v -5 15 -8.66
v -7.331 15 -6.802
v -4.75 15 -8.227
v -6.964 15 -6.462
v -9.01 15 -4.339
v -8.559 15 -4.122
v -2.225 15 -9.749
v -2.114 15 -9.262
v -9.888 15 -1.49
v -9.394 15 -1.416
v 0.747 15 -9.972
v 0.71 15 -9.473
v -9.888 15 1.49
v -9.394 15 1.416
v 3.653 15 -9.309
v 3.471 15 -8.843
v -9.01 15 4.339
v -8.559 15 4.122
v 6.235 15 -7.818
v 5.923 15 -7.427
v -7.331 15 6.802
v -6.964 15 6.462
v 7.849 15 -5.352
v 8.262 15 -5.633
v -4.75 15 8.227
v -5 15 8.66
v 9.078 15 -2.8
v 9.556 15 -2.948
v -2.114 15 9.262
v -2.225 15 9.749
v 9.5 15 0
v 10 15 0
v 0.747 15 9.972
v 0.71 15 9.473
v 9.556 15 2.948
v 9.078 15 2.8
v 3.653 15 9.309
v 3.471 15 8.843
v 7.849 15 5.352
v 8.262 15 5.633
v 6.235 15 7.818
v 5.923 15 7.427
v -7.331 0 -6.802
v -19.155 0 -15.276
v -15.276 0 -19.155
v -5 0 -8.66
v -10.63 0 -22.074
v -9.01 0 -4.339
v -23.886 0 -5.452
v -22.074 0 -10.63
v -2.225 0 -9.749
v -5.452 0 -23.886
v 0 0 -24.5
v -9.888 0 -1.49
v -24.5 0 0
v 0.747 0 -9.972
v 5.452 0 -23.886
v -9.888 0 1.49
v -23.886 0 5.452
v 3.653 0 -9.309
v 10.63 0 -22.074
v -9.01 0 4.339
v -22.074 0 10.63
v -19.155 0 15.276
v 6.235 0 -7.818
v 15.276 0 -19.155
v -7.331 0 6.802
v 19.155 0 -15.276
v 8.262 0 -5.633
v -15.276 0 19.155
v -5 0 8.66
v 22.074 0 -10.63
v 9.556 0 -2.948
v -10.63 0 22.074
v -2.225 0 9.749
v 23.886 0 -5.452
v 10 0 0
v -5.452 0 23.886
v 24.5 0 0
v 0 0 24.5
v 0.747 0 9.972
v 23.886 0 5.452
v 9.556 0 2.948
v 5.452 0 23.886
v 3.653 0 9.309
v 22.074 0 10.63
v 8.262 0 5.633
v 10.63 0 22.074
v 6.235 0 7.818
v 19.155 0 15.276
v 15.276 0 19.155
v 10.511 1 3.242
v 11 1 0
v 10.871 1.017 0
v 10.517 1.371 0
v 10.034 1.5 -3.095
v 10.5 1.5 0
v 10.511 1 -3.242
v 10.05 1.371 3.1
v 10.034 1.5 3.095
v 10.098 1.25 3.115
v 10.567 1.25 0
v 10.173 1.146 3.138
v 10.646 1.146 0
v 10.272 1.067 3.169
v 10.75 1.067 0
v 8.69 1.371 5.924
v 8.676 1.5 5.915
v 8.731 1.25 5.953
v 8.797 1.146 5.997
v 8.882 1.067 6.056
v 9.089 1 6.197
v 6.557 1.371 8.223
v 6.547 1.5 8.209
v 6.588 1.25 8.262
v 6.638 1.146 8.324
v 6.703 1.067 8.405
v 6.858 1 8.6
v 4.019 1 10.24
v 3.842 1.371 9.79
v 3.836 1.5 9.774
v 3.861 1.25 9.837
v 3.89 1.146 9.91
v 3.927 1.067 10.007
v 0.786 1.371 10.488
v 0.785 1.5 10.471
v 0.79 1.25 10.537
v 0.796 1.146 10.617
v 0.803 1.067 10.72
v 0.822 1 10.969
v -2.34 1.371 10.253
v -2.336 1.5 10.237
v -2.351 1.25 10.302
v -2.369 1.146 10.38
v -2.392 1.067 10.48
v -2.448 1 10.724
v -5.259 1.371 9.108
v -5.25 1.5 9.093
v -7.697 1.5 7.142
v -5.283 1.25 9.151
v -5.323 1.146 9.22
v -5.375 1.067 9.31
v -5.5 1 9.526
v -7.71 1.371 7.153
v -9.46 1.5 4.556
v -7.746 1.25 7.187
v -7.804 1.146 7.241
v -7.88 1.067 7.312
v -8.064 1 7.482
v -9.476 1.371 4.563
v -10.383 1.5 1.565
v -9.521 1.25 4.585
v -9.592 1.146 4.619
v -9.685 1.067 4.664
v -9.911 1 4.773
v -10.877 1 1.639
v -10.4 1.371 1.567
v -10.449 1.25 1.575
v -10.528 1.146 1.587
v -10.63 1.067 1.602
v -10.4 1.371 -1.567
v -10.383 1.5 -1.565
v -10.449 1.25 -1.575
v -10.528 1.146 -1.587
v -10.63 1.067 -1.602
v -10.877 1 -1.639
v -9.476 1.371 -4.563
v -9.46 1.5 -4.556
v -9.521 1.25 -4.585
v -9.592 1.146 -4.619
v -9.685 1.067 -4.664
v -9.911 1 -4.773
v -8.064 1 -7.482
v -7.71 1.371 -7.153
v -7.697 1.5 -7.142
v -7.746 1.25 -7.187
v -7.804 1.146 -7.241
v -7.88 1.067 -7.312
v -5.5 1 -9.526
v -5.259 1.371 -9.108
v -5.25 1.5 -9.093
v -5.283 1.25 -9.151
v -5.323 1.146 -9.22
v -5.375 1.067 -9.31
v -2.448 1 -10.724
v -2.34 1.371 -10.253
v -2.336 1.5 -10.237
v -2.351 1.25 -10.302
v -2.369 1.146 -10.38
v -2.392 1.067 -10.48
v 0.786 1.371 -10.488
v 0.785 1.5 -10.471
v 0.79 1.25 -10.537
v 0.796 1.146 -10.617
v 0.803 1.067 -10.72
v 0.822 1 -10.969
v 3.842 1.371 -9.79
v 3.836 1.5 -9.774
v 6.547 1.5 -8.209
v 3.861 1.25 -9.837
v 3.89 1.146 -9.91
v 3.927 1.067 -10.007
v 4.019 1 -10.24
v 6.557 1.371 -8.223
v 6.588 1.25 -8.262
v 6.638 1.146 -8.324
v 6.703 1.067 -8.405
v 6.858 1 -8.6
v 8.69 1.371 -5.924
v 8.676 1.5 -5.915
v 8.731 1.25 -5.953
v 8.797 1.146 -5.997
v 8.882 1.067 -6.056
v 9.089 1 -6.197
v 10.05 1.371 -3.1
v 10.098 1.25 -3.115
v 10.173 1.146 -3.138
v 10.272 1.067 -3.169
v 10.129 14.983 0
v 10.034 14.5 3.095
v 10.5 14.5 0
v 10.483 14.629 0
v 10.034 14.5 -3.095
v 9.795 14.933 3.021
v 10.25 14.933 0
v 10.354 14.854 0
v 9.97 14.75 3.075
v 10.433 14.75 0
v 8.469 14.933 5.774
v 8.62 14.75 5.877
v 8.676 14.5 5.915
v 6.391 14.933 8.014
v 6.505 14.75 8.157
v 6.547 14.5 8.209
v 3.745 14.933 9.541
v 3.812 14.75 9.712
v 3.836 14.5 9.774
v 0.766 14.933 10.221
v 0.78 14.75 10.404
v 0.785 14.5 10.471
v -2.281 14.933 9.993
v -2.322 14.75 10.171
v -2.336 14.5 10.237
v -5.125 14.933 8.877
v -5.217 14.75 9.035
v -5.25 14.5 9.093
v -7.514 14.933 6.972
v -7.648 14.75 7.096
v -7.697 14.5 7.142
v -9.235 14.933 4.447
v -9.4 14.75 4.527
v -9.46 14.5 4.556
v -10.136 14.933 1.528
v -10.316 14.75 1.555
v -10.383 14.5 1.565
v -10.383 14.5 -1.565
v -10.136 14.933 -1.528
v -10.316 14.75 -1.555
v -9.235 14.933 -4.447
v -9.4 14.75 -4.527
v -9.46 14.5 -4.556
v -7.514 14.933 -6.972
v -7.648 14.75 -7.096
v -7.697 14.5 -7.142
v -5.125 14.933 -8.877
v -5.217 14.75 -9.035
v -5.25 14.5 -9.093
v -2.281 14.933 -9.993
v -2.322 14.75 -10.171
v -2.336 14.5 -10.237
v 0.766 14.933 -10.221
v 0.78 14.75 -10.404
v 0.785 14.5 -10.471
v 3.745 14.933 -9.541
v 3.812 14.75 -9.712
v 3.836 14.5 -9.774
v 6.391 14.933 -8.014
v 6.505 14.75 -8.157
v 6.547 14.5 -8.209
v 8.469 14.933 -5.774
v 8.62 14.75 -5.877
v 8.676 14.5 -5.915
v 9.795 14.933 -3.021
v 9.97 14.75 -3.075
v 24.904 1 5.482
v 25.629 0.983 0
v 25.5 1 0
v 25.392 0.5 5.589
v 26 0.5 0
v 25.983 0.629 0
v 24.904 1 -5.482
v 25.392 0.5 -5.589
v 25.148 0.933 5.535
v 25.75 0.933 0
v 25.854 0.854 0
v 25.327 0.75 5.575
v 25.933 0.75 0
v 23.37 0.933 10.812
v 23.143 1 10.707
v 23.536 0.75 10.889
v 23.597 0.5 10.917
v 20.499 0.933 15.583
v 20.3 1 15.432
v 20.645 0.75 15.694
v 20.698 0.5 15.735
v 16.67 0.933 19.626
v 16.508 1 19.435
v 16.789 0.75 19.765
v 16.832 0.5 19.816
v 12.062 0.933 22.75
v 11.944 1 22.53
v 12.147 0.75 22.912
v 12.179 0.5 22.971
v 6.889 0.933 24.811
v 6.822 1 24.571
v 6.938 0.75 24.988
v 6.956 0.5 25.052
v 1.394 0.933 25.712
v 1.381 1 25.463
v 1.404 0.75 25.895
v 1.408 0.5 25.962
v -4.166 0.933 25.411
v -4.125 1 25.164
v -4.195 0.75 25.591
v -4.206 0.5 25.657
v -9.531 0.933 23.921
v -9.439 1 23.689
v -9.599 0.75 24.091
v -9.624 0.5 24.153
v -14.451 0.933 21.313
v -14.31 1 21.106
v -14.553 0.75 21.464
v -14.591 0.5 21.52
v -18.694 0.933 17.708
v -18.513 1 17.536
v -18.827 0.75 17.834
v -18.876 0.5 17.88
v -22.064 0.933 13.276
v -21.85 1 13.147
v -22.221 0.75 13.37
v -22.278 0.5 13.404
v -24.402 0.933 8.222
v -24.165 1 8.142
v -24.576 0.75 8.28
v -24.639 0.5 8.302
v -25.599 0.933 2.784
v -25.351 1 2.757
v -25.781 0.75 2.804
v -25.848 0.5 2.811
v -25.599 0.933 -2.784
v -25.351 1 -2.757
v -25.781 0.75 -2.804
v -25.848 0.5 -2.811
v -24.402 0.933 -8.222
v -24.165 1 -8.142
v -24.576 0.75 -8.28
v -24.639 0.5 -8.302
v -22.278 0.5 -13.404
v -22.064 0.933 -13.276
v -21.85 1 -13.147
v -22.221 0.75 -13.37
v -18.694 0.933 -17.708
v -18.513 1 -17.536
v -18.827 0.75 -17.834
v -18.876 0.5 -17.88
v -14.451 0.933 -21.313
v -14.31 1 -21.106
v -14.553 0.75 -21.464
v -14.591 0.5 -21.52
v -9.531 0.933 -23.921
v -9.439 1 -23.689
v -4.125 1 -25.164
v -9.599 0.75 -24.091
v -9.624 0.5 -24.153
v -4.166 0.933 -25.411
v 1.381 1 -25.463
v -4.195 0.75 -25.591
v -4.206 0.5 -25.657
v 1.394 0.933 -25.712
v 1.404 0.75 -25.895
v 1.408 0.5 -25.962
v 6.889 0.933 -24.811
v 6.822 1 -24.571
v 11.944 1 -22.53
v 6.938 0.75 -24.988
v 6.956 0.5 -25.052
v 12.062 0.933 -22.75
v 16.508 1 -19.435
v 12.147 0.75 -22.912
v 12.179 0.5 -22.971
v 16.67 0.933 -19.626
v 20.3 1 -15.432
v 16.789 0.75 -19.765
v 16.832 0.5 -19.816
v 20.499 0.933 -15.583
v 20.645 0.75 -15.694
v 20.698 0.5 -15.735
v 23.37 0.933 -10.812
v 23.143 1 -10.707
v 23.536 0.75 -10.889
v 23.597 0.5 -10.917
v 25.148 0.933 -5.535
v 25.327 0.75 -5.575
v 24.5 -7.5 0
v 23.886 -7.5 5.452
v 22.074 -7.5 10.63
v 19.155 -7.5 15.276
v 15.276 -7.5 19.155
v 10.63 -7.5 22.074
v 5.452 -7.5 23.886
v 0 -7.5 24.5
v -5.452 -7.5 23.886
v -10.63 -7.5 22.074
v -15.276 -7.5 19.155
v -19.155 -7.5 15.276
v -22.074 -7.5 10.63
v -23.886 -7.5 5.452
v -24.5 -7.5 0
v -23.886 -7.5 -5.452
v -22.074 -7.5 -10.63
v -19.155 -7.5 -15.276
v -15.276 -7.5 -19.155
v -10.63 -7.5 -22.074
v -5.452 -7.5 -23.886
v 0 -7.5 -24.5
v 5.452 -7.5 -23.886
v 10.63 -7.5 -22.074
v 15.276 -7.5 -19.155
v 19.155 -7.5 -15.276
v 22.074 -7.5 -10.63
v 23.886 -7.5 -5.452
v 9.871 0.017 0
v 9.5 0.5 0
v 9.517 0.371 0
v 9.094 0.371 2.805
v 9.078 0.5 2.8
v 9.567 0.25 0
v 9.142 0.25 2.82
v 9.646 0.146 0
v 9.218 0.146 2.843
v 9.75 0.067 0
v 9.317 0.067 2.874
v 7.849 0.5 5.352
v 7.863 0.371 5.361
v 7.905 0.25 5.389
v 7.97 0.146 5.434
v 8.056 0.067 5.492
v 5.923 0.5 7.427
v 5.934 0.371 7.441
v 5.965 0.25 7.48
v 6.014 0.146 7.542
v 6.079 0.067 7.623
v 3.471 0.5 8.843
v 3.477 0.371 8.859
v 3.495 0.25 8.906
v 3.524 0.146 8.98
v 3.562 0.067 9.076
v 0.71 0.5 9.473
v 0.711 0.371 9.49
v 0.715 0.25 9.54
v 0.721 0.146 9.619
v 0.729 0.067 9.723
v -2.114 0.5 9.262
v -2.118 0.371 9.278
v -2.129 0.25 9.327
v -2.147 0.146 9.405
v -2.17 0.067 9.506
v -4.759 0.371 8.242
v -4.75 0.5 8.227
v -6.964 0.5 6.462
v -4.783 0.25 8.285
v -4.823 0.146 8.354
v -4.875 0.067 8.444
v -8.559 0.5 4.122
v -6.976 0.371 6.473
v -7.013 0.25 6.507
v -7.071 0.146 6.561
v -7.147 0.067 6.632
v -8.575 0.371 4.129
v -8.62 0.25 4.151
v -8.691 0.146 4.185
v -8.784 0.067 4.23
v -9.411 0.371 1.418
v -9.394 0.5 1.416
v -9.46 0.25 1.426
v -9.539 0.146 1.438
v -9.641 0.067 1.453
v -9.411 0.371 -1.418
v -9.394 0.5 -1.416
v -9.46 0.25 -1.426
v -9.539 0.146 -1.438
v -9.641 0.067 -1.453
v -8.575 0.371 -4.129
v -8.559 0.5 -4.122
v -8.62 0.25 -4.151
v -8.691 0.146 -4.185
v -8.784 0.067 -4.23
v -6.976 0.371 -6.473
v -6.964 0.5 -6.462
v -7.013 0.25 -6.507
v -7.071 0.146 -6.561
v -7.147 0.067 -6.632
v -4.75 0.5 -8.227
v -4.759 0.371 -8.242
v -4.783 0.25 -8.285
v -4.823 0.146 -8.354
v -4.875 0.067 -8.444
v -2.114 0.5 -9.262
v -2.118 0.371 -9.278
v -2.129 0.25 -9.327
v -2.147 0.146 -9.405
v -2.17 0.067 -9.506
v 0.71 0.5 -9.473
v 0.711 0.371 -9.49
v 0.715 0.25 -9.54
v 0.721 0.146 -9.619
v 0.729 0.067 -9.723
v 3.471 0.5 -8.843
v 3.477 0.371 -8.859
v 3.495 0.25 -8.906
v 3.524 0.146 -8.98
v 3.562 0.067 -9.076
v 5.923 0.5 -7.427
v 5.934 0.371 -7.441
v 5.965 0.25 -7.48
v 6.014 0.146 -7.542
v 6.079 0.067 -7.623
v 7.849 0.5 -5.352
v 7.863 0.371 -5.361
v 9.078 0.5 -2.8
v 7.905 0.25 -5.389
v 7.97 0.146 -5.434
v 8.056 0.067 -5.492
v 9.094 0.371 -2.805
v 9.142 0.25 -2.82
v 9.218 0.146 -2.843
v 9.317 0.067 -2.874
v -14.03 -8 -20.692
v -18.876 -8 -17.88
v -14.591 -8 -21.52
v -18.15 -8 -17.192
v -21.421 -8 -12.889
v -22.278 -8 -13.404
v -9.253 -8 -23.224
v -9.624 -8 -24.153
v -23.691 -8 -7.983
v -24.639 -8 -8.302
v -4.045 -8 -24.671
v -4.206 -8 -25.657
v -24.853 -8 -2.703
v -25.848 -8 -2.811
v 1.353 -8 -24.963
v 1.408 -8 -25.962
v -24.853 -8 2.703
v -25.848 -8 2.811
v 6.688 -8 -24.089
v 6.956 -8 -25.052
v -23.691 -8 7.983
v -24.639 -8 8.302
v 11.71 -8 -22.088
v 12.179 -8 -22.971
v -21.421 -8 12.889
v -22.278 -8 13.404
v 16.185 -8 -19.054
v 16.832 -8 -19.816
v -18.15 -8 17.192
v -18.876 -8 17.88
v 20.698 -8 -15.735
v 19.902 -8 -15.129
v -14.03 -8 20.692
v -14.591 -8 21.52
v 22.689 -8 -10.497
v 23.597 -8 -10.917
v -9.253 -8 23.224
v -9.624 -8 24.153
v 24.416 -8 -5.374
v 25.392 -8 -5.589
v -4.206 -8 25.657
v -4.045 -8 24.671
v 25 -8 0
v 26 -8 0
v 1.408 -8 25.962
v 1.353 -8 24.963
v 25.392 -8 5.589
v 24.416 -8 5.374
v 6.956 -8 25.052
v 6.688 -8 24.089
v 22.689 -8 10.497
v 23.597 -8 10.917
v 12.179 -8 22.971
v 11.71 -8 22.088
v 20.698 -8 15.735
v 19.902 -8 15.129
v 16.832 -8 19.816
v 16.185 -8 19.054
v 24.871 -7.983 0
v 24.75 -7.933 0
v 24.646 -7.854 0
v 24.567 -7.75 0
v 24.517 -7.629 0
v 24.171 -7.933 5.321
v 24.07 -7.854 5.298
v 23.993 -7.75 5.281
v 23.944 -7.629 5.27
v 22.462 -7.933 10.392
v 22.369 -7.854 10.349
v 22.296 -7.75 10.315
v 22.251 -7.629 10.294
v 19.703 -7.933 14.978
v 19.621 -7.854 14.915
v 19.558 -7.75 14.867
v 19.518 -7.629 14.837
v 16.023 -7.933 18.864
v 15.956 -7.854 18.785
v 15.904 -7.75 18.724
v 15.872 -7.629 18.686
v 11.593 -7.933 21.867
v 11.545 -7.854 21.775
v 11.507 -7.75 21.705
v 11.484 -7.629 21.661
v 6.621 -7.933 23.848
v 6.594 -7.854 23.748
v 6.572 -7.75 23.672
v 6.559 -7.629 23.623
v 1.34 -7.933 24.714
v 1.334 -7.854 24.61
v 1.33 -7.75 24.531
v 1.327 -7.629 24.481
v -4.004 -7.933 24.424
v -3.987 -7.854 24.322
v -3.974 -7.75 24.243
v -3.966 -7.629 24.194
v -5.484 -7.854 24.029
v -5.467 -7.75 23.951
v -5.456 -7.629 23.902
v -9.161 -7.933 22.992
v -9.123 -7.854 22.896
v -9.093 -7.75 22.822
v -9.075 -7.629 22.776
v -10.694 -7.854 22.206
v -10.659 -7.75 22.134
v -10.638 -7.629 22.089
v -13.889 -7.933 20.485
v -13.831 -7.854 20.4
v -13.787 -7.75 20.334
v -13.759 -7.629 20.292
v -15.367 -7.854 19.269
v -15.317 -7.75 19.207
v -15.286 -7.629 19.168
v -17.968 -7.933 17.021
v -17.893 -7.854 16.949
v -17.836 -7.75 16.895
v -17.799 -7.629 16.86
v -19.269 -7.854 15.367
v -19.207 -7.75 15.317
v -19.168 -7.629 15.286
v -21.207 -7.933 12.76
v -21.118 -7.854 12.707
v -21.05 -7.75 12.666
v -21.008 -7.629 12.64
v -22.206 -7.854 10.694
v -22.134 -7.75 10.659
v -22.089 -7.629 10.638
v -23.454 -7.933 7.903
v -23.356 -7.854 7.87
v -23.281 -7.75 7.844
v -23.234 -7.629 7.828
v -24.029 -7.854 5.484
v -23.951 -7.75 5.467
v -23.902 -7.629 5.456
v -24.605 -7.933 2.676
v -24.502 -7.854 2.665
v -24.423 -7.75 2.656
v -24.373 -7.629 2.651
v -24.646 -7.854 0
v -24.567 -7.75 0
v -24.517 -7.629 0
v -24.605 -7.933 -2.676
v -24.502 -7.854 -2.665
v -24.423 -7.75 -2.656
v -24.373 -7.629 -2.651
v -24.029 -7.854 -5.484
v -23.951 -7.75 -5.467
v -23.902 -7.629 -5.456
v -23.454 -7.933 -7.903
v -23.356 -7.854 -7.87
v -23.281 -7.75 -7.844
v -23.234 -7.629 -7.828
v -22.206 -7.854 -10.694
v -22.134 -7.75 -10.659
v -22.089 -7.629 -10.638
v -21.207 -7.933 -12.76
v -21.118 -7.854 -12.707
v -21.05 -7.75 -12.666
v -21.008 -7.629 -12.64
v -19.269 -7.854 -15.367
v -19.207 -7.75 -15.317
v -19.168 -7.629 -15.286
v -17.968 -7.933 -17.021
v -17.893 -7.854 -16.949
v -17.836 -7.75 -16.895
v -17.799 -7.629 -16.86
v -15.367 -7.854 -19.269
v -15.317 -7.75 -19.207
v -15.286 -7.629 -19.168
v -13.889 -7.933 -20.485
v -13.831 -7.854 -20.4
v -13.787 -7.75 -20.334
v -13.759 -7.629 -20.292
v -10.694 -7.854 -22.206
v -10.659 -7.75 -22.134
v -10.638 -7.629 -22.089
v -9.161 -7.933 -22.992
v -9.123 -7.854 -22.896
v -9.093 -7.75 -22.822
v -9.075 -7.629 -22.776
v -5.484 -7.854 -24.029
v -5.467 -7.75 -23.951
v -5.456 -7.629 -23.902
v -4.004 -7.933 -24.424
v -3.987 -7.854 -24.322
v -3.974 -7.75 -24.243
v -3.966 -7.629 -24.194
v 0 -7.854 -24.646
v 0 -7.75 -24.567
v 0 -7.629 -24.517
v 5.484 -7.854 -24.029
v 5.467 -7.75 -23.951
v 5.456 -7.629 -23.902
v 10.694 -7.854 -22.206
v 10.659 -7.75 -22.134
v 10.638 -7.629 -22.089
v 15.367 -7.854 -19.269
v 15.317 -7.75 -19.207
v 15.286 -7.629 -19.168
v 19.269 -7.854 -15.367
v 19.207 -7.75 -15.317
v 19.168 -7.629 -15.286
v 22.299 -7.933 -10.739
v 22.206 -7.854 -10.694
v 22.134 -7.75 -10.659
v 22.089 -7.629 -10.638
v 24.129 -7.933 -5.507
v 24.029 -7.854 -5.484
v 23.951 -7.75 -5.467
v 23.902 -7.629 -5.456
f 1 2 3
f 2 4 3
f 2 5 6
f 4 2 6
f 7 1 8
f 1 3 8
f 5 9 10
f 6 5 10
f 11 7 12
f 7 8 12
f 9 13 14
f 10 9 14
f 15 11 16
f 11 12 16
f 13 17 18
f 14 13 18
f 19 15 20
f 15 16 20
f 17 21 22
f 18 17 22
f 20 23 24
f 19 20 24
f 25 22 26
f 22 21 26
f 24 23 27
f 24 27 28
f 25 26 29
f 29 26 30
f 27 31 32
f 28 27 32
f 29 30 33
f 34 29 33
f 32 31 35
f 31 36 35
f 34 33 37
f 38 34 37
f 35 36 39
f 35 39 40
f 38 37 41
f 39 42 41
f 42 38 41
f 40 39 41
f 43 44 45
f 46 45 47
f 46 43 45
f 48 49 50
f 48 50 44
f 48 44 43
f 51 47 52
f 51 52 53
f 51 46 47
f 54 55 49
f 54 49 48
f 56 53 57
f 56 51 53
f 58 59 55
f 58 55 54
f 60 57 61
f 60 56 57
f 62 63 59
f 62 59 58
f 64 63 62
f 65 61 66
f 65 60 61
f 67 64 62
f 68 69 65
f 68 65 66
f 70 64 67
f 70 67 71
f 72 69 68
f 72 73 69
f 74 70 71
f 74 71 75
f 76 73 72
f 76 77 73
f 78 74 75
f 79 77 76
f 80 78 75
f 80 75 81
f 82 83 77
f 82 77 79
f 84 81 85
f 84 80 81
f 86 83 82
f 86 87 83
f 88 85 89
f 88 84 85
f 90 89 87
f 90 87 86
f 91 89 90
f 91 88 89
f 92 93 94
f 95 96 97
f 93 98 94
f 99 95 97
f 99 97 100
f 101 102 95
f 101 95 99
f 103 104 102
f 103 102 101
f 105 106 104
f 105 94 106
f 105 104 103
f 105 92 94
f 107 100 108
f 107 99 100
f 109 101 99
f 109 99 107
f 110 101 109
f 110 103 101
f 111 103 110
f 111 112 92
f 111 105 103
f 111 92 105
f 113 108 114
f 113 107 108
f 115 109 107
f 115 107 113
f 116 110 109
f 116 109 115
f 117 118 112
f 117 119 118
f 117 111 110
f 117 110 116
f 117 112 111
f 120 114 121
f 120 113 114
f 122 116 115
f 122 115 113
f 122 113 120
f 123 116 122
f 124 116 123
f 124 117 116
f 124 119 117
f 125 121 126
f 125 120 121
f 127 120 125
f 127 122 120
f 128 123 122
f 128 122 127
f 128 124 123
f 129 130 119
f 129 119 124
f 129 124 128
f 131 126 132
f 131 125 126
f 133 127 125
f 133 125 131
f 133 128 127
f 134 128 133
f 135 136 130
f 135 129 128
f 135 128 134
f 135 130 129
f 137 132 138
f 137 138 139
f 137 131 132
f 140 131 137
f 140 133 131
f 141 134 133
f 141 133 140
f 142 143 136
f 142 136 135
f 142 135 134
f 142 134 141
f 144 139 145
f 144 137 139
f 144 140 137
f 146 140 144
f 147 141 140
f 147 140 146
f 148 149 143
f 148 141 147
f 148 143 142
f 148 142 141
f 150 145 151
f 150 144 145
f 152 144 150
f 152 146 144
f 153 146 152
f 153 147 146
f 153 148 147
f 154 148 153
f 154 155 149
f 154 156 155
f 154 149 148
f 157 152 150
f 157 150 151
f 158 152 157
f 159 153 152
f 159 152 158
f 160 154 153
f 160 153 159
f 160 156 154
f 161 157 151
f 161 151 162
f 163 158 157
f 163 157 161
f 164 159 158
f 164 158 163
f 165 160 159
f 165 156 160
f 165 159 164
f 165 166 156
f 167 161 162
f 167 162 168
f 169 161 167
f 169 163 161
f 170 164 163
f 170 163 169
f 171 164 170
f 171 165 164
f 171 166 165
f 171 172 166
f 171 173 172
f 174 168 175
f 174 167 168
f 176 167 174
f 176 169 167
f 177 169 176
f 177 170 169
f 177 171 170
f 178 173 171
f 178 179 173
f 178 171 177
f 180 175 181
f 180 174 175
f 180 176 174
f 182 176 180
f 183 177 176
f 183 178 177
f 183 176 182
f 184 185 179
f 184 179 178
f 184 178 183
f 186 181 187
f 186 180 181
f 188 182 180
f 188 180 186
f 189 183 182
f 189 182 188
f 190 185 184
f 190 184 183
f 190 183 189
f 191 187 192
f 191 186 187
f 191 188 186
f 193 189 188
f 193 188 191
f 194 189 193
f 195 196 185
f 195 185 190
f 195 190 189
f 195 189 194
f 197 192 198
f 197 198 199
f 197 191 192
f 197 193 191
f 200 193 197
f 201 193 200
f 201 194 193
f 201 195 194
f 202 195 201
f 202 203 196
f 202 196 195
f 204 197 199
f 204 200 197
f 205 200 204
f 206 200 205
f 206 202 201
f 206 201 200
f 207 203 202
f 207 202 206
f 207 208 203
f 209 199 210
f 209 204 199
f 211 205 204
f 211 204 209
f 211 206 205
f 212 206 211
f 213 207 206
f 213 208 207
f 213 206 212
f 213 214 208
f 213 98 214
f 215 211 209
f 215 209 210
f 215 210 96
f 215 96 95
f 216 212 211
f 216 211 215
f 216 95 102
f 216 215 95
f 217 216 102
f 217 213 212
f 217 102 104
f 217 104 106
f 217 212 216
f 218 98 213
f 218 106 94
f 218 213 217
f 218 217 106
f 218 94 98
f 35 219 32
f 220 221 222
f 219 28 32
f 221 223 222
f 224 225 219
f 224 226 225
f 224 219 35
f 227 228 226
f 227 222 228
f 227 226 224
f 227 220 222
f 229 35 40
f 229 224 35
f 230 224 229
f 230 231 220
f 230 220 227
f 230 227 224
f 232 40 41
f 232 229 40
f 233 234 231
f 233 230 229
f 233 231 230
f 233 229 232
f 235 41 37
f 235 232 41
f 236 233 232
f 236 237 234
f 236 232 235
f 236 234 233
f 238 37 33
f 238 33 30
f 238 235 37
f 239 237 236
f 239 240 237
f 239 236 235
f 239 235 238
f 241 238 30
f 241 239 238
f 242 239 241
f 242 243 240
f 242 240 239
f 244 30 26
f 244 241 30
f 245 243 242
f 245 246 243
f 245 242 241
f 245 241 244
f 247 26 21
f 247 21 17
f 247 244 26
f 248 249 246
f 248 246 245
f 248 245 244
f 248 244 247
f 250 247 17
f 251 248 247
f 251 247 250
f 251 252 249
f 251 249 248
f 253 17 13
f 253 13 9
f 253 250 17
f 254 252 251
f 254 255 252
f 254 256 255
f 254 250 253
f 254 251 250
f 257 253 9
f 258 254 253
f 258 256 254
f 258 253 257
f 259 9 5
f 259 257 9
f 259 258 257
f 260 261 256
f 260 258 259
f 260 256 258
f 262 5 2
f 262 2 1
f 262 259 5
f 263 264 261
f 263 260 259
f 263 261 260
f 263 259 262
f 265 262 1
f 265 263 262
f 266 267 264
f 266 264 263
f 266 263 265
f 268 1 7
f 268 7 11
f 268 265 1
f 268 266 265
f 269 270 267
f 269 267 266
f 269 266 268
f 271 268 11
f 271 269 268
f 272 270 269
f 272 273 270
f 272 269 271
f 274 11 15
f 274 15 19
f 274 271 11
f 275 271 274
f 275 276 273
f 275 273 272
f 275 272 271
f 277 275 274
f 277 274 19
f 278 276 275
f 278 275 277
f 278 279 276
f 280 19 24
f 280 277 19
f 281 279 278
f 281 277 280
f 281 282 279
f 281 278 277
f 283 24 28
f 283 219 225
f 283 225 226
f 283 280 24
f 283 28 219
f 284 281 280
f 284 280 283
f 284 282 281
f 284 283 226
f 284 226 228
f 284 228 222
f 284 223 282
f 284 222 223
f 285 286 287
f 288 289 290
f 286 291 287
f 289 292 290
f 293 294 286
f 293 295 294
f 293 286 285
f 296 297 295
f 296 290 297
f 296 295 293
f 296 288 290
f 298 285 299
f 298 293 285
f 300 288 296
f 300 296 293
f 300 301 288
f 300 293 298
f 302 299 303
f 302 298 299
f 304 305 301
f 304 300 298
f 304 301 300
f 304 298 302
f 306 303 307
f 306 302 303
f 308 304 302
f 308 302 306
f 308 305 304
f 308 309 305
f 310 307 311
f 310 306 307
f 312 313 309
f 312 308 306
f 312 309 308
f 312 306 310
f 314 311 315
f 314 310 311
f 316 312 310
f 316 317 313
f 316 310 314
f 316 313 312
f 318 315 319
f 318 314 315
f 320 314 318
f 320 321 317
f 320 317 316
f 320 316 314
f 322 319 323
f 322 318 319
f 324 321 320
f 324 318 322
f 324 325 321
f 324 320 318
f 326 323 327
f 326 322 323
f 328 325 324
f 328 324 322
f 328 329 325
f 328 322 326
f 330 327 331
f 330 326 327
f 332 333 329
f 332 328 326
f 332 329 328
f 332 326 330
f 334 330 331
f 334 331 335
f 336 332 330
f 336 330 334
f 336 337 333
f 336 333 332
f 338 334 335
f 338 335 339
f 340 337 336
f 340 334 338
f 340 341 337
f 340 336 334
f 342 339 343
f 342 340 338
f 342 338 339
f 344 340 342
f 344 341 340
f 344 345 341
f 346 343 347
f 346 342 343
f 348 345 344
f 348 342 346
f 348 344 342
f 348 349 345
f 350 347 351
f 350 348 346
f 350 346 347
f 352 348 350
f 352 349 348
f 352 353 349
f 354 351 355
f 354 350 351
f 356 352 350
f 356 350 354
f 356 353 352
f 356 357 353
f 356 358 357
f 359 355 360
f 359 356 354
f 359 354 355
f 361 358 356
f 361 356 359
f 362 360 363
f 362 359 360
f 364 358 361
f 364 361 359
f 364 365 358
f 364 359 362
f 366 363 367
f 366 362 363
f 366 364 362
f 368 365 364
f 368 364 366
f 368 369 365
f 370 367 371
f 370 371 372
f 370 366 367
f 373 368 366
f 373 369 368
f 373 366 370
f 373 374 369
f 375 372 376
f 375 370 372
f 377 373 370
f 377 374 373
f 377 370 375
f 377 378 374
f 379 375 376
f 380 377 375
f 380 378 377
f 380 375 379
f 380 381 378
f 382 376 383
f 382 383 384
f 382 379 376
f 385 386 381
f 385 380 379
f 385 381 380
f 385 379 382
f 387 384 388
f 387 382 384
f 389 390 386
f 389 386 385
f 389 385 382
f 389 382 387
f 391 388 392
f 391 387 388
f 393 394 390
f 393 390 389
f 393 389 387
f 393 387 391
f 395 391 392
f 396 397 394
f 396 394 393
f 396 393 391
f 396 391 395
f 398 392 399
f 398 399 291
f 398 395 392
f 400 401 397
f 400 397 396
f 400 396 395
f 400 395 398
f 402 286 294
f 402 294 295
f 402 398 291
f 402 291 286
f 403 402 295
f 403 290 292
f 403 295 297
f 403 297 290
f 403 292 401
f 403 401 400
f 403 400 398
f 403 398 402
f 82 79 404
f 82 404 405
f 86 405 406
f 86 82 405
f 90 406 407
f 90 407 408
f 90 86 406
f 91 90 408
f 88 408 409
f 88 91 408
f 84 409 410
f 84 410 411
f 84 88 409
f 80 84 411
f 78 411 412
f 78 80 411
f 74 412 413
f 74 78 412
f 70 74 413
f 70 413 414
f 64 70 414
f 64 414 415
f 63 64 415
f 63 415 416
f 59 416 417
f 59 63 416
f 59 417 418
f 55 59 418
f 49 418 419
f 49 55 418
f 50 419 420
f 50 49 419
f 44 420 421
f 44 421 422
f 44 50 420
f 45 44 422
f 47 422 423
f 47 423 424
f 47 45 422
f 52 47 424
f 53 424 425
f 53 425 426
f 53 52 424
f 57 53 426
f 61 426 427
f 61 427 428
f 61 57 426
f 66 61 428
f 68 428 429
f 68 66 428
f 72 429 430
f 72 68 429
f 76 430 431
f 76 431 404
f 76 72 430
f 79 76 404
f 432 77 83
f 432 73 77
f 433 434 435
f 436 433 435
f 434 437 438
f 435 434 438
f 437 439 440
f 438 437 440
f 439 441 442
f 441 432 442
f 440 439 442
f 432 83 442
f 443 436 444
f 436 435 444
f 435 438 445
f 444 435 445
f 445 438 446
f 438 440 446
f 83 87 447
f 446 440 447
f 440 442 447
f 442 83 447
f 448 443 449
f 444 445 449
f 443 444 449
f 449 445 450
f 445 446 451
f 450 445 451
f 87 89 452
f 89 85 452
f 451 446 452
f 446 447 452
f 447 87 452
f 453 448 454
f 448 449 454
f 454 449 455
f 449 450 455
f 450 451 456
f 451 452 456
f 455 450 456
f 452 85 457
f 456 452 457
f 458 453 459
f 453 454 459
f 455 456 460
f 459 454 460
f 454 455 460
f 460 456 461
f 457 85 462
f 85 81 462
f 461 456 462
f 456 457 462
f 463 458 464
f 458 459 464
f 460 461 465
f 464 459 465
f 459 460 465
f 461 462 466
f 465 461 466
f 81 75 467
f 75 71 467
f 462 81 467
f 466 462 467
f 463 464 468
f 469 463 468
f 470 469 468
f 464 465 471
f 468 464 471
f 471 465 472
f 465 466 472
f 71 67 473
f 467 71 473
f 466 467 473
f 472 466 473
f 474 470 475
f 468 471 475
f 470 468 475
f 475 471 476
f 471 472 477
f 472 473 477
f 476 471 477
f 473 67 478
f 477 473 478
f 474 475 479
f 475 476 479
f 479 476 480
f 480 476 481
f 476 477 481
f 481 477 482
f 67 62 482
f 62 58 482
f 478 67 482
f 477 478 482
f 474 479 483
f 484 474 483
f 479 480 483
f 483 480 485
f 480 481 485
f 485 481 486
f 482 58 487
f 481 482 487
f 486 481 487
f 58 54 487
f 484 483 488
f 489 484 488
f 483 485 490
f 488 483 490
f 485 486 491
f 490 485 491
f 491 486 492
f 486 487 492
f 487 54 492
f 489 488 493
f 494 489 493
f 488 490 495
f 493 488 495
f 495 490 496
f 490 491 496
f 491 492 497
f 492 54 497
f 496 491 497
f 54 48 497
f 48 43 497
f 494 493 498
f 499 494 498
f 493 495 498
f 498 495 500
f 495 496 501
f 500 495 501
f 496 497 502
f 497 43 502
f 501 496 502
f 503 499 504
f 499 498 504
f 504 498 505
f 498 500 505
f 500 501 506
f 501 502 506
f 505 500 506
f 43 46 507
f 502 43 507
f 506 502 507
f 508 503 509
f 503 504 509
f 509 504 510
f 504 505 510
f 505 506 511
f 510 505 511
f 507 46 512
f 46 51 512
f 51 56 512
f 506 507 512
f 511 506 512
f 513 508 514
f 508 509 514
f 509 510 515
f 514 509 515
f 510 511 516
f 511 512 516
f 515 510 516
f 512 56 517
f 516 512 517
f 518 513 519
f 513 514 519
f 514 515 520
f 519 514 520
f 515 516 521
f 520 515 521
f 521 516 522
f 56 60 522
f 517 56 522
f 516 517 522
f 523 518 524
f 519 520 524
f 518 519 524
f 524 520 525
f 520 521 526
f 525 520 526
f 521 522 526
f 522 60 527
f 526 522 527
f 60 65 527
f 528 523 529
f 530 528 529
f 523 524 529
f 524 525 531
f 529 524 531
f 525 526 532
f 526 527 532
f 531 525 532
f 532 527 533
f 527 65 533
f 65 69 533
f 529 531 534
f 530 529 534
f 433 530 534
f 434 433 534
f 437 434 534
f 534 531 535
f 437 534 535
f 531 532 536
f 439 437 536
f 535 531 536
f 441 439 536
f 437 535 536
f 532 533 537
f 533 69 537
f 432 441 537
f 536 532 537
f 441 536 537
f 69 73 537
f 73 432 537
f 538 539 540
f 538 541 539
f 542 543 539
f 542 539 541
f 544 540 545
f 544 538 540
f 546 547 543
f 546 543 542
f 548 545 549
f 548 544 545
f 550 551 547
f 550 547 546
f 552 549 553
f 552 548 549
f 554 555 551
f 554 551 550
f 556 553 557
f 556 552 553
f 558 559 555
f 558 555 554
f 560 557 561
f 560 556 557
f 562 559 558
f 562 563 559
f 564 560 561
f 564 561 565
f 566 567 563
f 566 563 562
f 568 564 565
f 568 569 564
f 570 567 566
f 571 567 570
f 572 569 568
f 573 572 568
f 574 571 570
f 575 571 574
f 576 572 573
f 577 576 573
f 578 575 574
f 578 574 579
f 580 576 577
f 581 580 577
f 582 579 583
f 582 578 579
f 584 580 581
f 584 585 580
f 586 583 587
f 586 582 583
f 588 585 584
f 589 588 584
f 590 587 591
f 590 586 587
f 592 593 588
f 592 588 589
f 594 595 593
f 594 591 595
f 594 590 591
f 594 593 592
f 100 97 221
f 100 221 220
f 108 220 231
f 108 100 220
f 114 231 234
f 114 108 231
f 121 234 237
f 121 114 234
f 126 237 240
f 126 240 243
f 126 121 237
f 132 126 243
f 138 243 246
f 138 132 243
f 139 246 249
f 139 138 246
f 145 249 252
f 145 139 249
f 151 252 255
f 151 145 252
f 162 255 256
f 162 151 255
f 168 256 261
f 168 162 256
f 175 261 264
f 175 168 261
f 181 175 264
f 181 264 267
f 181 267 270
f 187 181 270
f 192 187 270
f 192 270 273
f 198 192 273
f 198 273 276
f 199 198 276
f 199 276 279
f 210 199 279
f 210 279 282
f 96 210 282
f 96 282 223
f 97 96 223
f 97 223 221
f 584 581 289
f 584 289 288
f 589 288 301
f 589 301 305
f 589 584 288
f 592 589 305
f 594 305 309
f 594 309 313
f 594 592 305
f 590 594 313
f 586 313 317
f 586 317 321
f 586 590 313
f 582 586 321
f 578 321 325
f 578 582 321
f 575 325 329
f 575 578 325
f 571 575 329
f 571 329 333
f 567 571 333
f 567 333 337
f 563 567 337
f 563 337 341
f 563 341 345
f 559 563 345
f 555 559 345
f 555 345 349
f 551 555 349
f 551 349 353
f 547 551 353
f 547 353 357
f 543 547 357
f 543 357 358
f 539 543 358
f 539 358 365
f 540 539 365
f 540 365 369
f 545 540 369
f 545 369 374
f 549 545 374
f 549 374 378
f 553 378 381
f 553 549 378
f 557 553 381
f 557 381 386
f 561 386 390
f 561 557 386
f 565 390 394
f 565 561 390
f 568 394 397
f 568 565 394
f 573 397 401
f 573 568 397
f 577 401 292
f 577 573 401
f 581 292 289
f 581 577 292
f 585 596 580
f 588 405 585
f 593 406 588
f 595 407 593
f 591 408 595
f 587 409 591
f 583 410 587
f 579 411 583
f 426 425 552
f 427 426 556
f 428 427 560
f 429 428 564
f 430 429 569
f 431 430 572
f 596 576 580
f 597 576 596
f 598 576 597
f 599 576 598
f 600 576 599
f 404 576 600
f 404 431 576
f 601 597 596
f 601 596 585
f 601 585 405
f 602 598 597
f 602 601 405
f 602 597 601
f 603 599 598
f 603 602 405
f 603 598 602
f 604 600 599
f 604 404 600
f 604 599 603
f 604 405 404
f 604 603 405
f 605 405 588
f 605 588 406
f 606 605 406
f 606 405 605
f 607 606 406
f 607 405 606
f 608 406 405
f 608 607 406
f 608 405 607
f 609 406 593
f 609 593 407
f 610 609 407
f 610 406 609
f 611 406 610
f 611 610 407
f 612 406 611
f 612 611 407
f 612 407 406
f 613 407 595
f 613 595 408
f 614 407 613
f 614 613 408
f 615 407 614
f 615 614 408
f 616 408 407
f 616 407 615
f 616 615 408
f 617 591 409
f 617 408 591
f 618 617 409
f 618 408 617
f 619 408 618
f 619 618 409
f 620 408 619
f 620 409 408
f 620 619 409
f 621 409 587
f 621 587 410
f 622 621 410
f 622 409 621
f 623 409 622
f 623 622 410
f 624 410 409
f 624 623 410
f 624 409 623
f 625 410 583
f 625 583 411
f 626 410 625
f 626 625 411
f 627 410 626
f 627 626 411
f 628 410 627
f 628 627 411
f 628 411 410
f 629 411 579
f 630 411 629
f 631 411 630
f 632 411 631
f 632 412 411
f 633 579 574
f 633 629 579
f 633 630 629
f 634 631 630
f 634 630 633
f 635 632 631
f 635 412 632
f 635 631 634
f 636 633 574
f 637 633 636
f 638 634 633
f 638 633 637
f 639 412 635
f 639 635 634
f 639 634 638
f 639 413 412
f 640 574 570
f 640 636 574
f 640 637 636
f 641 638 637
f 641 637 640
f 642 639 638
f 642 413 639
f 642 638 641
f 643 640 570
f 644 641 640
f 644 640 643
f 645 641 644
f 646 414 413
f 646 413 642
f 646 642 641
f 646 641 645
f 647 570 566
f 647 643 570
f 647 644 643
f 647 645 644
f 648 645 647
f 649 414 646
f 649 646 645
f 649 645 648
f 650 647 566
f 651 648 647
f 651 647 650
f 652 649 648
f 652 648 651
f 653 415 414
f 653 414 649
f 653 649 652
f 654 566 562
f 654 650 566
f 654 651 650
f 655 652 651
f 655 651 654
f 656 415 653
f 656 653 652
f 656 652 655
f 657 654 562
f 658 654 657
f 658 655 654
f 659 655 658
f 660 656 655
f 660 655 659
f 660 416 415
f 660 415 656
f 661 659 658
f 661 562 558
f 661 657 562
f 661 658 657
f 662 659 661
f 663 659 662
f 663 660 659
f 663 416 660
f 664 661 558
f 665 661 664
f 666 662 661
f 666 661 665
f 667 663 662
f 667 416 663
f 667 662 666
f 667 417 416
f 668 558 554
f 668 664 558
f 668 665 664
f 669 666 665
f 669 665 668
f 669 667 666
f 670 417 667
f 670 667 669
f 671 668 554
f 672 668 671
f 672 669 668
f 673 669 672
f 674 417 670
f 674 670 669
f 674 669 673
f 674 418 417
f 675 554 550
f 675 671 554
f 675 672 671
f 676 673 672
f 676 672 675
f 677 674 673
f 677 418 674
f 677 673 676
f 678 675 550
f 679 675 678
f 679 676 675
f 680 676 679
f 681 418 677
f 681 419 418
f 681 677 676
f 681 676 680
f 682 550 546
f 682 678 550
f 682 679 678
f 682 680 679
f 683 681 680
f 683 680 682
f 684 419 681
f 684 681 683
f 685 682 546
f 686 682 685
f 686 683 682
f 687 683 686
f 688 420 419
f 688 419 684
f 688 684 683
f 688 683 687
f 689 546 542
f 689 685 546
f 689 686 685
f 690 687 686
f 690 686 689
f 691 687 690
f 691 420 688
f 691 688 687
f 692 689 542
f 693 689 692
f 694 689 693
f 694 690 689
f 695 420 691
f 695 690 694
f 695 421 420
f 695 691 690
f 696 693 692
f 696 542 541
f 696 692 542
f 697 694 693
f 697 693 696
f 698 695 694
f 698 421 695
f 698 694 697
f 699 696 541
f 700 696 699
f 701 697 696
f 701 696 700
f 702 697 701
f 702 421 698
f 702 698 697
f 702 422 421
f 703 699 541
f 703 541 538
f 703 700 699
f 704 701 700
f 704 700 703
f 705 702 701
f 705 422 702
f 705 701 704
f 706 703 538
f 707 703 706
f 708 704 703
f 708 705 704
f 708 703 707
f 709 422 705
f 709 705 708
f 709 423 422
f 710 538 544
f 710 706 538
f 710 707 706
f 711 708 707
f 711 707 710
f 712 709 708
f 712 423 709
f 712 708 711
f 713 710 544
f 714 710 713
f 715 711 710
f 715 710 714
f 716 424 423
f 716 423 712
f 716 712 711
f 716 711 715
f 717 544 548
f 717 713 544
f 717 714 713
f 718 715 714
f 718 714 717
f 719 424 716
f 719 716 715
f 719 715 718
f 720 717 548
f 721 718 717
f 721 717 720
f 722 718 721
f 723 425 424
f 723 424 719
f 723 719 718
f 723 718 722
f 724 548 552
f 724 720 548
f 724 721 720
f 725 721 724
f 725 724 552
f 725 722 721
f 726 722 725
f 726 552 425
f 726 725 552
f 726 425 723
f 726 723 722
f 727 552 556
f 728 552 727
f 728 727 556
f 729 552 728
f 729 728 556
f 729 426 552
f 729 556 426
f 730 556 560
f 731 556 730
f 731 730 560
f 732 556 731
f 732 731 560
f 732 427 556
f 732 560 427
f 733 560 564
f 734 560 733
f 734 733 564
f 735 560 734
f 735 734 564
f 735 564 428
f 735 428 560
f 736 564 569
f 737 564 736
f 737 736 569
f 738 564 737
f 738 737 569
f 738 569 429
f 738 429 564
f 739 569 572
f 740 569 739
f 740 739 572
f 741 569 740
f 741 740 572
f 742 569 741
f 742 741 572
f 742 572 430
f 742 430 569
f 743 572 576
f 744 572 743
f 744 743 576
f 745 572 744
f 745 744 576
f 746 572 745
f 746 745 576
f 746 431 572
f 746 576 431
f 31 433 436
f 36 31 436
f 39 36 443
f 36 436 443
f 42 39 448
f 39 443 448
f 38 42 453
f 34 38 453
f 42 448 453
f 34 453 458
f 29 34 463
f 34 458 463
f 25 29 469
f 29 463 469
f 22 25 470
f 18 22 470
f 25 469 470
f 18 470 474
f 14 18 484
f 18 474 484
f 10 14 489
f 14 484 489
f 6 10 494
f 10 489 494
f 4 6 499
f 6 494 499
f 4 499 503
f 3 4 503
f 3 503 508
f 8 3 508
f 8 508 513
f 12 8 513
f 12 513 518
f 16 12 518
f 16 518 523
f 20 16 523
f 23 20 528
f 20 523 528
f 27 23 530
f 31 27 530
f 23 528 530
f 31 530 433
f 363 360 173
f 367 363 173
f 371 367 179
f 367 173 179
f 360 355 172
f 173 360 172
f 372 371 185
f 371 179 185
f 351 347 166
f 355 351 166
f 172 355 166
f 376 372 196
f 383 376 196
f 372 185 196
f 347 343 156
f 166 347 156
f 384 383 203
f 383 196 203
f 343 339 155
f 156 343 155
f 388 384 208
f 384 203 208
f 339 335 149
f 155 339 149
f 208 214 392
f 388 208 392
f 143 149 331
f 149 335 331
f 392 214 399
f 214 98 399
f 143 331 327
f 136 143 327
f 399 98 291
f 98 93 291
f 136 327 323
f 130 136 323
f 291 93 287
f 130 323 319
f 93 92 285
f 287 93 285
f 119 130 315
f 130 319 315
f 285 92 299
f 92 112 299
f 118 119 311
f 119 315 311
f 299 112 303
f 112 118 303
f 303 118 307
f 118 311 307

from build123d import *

# Parameters (mm, degrees)
F0_R     = 26
F0_R_2   = 24.5
F1_DEPTH = 8
F2_R     = 26
F2_R_2   = 9.5
F3_DEPTH = 1
F4_R     = 10.5
F4_R_2   = 9.5
F5_DEPTH = 15
F6_R     = 0.5


with BuildPart() as f1:
    # F0 (on Front) → F1 (new body)
    with BuildSketch(Plane.XZ):
        Circle(F0_R)
        Circle(F0_R_2, mode=Mode.SUBTRACT)
    extrude(amount=F1_DEPTH)

    # F2 (on Front) → F3 (join)
    with BuildSketch(Plane.XZ):
        Circle(F2_R)
        Circle(F2_R_2, mode=Mode.SUBTRACT)
    extrude(amount=-F3_DEPTH)

    # F4 (on Front) → F5 (join)
    with BuildSketch(Plane.XZ):
        Circle(F4_R)
        Circle(F4_R_2, mode=Mode.SUBTRACT)
    extrude(amount=-F5_DEPTH)

    # F6
    f6_edges = [f1.edges().sort_by_distance(p)[0] for p in [
        (-26, 1, 0),
        (-10.5, 1, 0),
        (-10.5, 15, 0),
        (-24.5, -8, 0),
        (-9.5, 0, 0),
    ]]
    fillet(f6_edges, radius=F6_R)


solid = f1.part
